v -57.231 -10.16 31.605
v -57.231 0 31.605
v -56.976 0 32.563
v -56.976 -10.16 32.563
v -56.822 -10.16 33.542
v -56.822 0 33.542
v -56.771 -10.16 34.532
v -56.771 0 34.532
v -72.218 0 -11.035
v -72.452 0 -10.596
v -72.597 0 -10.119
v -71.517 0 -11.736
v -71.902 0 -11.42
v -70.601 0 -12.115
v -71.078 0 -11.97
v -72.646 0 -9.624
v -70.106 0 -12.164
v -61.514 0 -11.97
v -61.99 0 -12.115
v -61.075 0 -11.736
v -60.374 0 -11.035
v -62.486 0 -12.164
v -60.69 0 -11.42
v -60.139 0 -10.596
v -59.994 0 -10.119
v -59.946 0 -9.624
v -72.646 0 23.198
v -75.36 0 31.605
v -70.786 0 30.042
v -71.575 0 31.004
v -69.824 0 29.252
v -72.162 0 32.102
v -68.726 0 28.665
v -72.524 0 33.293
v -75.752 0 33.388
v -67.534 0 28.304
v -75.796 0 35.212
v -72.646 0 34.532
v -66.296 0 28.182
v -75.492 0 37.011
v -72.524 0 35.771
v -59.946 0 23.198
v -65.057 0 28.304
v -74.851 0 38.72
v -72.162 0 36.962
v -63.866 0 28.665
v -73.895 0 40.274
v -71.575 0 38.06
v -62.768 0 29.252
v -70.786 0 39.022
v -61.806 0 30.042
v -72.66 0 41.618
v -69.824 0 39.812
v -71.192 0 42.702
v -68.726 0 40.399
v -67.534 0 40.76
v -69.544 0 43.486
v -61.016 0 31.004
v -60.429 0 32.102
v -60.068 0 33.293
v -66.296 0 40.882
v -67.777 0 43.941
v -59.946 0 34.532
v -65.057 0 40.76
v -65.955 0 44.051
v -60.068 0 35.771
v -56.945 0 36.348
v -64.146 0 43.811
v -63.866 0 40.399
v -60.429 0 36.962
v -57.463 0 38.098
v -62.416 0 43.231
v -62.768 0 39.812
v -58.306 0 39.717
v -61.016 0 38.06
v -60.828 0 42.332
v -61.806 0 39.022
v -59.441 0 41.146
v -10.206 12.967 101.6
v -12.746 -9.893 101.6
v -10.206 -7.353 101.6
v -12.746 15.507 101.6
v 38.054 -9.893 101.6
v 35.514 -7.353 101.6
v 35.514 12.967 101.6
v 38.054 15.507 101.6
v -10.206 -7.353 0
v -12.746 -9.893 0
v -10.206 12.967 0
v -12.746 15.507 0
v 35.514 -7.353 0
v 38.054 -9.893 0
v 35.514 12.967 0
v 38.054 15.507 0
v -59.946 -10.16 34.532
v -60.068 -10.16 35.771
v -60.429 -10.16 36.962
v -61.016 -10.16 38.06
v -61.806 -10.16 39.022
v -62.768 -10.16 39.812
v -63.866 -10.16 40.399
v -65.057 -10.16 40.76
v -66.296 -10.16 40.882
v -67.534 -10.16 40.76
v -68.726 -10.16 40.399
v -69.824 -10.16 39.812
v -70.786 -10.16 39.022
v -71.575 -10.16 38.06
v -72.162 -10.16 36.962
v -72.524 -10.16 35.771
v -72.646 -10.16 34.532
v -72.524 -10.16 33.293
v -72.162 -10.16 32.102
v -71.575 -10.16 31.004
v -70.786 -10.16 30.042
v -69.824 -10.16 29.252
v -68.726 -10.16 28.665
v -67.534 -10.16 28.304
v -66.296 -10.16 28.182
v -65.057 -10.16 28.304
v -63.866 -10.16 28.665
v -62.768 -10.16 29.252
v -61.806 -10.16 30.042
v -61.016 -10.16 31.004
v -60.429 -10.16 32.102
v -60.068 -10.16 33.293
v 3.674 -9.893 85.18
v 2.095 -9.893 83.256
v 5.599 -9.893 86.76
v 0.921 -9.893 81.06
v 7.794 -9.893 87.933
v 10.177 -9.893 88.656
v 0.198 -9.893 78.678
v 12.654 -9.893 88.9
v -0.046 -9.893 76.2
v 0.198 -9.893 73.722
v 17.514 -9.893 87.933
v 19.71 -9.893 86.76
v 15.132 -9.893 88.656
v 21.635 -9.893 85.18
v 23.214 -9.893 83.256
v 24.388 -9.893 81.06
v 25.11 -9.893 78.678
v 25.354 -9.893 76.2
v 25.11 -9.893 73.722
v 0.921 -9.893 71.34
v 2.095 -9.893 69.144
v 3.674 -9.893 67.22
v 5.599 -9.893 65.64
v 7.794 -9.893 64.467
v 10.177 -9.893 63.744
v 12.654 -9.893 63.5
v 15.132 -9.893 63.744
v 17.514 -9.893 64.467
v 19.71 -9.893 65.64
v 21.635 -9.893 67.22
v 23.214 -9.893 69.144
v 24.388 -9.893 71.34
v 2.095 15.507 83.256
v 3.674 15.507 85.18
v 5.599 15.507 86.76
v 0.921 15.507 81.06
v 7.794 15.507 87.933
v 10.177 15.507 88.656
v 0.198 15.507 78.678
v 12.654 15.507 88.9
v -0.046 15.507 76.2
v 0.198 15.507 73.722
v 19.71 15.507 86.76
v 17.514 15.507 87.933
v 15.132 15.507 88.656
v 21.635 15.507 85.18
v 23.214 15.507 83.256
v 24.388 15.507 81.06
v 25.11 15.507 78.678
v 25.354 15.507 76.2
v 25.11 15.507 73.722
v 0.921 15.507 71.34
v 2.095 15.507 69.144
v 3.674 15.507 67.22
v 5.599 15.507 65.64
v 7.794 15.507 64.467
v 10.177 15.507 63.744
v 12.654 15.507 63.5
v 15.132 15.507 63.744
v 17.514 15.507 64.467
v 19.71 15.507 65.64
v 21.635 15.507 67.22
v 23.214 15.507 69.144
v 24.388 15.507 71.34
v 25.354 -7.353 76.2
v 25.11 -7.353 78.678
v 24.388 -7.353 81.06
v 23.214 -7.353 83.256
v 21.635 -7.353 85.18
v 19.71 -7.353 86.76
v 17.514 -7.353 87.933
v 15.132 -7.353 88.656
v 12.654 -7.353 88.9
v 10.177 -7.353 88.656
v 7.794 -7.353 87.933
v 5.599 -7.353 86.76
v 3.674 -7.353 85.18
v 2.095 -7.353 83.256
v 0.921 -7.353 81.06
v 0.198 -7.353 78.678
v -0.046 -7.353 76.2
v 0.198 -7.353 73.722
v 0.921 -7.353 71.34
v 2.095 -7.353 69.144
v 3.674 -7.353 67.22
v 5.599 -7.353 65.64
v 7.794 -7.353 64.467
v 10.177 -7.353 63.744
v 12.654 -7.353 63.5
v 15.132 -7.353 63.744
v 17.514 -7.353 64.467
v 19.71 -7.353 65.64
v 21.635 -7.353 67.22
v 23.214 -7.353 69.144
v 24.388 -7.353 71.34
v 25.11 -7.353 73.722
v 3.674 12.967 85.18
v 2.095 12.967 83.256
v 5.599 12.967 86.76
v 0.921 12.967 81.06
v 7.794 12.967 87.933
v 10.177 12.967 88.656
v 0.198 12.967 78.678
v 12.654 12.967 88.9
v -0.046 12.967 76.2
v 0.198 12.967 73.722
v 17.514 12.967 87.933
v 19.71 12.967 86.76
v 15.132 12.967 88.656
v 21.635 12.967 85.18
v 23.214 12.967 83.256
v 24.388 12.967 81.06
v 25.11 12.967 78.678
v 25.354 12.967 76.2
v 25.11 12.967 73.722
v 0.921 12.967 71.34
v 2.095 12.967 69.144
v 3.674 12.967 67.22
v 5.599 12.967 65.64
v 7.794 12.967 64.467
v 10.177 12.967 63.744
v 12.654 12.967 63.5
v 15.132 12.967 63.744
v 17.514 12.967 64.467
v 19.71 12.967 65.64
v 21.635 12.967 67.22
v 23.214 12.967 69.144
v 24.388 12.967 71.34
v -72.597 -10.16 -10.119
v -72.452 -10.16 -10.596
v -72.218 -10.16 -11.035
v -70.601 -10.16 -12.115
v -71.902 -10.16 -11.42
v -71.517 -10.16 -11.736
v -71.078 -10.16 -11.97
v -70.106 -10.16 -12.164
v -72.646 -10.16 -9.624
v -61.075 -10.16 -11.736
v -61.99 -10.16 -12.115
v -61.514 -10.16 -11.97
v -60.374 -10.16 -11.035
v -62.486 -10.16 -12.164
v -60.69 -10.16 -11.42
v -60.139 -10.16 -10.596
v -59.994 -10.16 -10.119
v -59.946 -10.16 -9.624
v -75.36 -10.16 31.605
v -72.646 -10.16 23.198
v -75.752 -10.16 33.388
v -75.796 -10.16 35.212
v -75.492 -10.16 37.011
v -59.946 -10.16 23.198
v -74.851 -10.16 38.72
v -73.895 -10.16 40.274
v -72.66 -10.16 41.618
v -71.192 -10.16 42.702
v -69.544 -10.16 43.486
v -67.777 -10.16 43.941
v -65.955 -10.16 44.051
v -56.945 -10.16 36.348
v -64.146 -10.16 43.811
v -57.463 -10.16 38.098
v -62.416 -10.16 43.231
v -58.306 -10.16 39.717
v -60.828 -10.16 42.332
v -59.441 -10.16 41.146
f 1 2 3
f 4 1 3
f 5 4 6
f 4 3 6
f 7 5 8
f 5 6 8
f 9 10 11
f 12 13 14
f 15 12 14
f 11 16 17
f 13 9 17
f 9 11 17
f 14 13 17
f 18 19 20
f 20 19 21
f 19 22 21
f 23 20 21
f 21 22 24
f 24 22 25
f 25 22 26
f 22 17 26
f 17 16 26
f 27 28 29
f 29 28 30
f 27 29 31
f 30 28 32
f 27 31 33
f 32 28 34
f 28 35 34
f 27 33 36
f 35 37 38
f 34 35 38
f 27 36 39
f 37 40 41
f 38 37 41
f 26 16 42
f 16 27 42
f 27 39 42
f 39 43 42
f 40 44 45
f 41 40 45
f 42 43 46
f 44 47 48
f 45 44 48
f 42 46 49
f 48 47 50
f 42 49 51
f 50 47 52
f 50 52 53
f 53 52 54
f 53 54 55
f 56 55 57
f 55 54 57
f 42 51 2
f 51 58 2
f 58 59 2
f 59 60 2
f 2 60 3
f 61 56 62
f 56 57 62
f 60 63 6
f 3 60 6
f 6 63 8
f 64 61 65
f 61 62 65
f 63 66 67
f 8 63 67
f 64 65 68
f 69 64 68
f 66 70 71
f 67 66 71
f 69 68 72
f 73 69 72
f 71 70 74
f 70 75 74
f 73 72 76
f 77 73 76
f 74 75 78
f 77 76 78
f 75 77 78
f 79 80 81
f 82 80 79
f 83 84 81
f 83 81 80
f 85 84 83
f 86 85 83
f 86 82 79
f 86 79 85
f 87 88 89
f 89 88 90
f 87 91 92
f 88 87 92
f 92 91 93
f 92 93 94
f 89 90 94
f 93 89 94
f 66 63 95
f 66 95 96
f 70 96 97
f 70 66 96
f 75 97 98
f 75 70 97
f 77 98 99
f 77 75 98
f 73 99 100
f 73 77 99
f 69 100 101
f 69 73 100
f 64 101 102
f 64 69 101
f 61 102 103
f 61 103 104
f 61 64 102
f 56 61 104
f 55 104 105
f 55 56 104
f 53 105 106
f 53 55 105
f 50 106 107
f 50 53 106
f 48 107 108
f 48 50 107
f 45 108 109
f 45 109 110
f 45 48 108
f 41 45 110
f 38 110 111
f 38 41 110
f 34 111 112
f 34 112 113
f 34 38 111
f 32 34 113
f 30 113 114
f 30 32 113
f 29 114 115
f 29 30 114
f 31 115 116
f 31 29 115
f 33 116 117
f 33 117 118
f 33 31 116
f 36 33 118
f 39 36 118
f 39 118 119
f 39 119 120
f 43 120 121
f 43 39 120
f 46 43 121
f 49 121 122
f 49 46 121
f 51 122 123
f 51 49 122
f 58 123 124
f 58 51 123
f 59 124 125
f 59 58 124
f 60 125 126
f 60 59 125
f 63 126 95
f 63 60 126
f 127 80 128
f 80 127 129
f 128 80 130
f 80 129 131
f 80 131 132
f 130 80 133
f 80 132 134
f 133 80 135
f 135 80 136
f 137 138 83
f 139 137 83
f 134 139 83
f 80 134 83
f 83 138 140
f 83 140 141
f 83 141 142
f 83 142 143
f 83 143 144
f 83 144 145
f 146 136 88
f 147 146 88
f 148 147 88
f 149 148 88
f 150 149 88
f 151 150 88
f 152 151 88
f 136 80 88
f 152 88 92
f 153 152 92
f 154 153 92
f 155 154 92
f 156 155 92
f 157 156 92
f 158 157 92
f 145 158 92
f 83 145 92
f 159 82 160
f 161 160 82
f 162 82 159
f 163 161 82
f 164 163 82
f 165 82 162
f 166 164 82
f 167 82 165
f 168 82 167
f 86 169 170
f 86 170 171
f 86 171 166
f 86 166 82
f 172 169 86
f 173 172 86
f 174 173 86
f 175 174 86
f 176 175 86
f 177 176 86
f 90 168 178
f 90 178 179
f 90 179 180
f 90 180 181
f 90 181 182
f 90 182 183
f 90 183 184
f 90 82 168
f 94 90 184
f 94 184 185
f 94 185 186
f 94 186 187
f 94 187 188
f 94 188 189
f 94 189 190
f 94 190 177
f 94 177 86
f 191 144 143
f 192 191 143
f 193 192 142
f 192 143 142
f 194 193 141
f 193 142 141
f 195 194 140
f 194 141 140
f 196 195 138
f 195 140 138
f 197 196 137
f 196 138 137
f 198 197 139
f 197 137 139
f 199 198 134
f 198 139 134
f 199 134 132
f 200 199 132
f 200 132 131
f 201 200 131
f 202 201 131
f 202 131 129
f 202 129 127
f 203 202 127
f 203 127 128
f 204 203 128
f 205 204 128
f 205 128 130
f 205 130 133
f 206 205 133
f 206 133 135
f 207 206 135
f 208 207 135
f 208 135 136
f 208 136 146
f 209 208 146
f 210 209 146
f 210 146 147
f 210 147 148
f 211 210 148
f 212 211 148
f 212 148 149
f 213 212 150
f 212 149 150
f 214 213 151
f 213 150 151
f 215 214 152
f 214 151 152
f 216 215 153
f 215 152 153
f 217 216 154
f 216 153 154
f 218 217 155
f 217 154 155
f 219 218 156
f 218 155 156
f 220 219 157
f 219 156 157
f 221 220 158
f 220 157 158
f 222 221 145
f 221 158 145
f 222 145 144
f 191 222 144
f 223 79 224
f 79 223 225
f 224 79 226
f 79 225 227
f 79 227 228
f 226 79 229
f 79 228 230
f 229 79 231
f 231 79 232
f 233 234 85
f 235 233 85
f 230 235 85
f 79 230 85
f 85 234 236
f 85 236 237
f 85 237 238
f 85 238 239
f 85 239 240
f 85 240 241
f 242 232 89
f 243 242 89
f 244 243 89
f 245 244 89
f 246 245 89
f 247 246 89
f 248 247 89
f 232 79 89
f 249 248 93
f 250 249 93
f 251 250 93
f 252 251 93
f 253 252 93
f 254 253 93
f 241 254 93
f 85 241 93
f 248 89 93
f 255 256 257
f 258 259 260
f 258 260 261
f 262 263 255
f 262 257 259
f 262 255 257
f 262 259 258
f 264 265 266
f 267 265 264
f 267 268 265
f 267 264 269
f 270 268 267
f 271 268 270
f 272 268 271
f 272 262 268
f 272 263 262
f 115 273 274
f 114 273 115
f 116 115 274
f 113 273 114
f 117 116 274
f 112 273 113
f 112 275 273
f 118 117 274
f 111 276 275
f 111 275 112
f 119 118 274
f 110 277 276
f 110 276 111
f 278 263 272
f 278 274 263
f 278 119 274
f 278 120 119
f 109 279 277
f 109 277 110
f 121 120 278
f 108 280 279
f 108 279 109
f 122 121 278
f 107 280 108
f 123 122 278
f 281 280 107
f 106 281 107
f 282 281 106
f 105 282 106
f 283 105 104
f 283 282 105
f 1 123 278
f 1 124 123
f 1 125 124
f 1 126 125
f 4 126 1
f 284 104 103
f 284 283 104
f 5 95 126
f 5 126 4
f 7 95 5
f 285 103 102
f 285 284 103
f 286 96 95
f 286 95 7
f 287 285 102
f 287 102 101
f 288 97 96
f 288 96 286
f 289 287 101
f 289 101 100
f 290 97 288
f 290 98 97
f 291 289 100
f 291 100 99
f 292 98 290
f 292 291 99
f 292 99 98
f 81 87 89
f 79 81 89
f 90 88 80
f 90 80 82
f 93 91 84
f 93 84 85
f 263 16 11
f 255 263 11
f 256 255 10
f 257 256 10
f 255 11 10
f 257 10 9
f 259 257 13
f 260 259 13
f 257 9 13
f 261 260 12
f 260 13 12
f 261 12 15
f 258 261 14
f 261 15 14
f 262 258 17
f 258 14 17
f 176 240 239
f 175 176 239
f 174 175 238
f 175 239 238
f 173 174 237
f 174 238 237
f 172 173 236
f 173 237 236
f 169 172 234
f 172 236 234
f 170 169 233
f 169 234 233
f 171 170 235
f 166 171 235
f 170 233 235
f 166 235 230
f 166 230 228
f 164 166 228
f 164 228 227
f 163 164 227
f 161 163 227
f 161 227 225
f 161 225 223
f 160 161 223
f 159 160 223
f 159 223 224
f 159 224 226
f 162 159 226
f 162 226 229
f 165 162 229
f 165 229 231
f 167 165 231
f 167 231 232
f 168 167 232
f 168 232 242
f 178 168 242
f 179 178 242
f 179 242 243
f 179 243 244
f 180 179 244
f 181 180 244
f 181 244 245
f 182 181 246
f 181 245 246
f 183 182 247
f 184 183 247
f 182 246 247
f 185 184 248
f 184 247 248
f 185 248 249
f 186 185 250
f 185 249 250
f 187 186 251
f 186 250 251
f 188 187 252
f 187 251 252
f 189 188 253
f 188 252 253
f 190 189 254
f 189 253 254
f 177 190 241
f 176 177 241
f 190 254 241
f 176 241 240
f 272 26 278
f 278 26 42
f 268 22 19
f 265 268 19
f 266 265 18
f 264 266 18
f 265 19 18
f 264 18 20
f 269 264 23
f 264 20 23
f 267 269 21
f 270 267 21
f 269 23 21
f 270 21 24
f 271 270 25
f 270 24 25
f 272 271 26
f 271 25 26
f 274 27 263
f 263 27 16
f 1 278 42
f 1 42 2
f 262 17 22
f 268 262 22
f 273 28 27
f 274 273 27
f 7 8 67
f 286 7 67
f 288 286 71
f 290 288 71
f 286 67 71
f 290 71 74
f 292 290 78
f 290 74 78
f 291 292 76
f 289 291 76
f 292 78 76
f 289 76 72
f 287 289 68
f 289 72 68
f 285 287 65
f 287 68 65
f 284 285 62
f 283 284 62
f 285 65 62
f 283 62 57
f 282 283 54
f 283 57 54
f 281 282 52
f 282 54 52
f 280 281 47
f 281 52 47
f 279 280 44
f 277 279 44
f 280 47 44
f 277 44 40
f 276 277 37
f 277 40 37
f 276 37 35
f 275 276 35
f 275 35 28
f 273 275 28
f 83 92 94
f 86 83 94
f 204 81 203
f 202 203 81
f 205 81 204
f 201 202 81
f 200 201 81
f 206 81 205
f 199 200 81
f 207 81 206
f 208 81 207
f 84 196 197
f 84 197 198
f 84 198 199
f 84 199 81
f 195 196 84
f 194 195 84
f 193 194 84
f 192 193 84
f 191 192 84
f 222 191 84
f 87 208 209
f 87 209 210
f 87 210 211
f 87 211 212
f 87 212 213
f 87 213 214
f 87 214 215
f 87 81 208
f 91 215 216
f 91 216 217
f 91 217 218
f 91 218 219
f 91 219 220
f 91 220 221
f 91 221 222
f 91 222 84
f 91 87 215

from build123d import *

# Parameters (mm, degrees)
F1_W     = 50.8
F1_H     = 25.4
F1_W_2   = 45.72
F1_H_2   = 20.3200011688
F2_DEPTH = 101.6
F3_R     = 12.7
F4_DEPTH = 25.4
F5_R     = 6.35
F6_DEPTH = 10.16


# Not quite as in the source:
# - a variable given as a bare number and used for a length is read in inches; the dataset says mm whatever the document's units were


with BuildPart() as f2:
    # F1 (on Top) → F2 (new body)
    with BuildSketch(Plane.XY):
        with Locations((12.6543196693, 2.8071403882)):
            Rectangle(F1_W, F1_H)
        with Locations((12.6543196693, 2.8071398037)):
            Rectangle(F1_W_2, F1_H_2, mode=Mode.SUBTRACT)
    extrude(amount=F2_DEPTH)

    # F3 (on face) → F4 (cut, through all)
    with BuildSketch(Plane.XZ.offset(9.8928596118)):
        with Locations((12.6543196693, 76.2)):
            Circle(F3_R)
    extrude(amount=-F4_DEPTH, mode=Mode.SUBTRACT)


with BuildPart() as f6:
    # F5 (on Front) → F6 (new body)
    with BuildSketch(Plane.XZ):
        with BuildLine():
            ThreePointArc((-56.7706652855, 34.5319435), (-67.7769258766, 43.9410609965), (-75.3599549571, 31.6054647715))
            ThreePointArc((-75.3599549571, 31.6054647715), (-66.2956652855, 25.0069435), (-57.2313756138, 31.6054647715))
            ThreePointArc((-57.2313756138, 31.6054647715), (-56.8865477891, 33.0506829089), (-56.7706652855, 34.5319435))
        make_face()
        with Locations((-66.2956652855, 34.5319435)):
            Circle(F5_R, mode=Mode.SUBTRACT)
        with BuildLine():
            Line((-75.3599549571, 31.6054647715), (-72.6456652855, 23.1983960315))
            Line((-72.6456652855, 23.1983960315), (-72.6456652855, -9.6236144723))
            ThreePointArc((-72.6456652855, -9.6236144723), (-71.9017165097, -11.4196656965), (-70.1056652855, -12.1636144723))
            Line((-70.1056652855, -12.1636144723), (-62.4856652855, -12.1636144723))
            ThreePointArc((-62.4856652855, -12.1636144723), (-60.6896140613, -11.4196656965), (-59.9456652855, -9.6236144723))
            Line((-59.9456652855, -9.6236144723), (-59.9456652855, 23.1983960315))
            Line((-59.9456652855, 23.1983960315), (-57.2313756138, 31.6054647715))
            ThreePointArc((-57.2313756138, 31.6054647715), (-66.2956652855, 25.0069435), (-75.3599549571, 31.6054647715))
        make_face()
    extrude(amount=F6_DEPTH)


solid = Compound([f2.part, f6.part])
